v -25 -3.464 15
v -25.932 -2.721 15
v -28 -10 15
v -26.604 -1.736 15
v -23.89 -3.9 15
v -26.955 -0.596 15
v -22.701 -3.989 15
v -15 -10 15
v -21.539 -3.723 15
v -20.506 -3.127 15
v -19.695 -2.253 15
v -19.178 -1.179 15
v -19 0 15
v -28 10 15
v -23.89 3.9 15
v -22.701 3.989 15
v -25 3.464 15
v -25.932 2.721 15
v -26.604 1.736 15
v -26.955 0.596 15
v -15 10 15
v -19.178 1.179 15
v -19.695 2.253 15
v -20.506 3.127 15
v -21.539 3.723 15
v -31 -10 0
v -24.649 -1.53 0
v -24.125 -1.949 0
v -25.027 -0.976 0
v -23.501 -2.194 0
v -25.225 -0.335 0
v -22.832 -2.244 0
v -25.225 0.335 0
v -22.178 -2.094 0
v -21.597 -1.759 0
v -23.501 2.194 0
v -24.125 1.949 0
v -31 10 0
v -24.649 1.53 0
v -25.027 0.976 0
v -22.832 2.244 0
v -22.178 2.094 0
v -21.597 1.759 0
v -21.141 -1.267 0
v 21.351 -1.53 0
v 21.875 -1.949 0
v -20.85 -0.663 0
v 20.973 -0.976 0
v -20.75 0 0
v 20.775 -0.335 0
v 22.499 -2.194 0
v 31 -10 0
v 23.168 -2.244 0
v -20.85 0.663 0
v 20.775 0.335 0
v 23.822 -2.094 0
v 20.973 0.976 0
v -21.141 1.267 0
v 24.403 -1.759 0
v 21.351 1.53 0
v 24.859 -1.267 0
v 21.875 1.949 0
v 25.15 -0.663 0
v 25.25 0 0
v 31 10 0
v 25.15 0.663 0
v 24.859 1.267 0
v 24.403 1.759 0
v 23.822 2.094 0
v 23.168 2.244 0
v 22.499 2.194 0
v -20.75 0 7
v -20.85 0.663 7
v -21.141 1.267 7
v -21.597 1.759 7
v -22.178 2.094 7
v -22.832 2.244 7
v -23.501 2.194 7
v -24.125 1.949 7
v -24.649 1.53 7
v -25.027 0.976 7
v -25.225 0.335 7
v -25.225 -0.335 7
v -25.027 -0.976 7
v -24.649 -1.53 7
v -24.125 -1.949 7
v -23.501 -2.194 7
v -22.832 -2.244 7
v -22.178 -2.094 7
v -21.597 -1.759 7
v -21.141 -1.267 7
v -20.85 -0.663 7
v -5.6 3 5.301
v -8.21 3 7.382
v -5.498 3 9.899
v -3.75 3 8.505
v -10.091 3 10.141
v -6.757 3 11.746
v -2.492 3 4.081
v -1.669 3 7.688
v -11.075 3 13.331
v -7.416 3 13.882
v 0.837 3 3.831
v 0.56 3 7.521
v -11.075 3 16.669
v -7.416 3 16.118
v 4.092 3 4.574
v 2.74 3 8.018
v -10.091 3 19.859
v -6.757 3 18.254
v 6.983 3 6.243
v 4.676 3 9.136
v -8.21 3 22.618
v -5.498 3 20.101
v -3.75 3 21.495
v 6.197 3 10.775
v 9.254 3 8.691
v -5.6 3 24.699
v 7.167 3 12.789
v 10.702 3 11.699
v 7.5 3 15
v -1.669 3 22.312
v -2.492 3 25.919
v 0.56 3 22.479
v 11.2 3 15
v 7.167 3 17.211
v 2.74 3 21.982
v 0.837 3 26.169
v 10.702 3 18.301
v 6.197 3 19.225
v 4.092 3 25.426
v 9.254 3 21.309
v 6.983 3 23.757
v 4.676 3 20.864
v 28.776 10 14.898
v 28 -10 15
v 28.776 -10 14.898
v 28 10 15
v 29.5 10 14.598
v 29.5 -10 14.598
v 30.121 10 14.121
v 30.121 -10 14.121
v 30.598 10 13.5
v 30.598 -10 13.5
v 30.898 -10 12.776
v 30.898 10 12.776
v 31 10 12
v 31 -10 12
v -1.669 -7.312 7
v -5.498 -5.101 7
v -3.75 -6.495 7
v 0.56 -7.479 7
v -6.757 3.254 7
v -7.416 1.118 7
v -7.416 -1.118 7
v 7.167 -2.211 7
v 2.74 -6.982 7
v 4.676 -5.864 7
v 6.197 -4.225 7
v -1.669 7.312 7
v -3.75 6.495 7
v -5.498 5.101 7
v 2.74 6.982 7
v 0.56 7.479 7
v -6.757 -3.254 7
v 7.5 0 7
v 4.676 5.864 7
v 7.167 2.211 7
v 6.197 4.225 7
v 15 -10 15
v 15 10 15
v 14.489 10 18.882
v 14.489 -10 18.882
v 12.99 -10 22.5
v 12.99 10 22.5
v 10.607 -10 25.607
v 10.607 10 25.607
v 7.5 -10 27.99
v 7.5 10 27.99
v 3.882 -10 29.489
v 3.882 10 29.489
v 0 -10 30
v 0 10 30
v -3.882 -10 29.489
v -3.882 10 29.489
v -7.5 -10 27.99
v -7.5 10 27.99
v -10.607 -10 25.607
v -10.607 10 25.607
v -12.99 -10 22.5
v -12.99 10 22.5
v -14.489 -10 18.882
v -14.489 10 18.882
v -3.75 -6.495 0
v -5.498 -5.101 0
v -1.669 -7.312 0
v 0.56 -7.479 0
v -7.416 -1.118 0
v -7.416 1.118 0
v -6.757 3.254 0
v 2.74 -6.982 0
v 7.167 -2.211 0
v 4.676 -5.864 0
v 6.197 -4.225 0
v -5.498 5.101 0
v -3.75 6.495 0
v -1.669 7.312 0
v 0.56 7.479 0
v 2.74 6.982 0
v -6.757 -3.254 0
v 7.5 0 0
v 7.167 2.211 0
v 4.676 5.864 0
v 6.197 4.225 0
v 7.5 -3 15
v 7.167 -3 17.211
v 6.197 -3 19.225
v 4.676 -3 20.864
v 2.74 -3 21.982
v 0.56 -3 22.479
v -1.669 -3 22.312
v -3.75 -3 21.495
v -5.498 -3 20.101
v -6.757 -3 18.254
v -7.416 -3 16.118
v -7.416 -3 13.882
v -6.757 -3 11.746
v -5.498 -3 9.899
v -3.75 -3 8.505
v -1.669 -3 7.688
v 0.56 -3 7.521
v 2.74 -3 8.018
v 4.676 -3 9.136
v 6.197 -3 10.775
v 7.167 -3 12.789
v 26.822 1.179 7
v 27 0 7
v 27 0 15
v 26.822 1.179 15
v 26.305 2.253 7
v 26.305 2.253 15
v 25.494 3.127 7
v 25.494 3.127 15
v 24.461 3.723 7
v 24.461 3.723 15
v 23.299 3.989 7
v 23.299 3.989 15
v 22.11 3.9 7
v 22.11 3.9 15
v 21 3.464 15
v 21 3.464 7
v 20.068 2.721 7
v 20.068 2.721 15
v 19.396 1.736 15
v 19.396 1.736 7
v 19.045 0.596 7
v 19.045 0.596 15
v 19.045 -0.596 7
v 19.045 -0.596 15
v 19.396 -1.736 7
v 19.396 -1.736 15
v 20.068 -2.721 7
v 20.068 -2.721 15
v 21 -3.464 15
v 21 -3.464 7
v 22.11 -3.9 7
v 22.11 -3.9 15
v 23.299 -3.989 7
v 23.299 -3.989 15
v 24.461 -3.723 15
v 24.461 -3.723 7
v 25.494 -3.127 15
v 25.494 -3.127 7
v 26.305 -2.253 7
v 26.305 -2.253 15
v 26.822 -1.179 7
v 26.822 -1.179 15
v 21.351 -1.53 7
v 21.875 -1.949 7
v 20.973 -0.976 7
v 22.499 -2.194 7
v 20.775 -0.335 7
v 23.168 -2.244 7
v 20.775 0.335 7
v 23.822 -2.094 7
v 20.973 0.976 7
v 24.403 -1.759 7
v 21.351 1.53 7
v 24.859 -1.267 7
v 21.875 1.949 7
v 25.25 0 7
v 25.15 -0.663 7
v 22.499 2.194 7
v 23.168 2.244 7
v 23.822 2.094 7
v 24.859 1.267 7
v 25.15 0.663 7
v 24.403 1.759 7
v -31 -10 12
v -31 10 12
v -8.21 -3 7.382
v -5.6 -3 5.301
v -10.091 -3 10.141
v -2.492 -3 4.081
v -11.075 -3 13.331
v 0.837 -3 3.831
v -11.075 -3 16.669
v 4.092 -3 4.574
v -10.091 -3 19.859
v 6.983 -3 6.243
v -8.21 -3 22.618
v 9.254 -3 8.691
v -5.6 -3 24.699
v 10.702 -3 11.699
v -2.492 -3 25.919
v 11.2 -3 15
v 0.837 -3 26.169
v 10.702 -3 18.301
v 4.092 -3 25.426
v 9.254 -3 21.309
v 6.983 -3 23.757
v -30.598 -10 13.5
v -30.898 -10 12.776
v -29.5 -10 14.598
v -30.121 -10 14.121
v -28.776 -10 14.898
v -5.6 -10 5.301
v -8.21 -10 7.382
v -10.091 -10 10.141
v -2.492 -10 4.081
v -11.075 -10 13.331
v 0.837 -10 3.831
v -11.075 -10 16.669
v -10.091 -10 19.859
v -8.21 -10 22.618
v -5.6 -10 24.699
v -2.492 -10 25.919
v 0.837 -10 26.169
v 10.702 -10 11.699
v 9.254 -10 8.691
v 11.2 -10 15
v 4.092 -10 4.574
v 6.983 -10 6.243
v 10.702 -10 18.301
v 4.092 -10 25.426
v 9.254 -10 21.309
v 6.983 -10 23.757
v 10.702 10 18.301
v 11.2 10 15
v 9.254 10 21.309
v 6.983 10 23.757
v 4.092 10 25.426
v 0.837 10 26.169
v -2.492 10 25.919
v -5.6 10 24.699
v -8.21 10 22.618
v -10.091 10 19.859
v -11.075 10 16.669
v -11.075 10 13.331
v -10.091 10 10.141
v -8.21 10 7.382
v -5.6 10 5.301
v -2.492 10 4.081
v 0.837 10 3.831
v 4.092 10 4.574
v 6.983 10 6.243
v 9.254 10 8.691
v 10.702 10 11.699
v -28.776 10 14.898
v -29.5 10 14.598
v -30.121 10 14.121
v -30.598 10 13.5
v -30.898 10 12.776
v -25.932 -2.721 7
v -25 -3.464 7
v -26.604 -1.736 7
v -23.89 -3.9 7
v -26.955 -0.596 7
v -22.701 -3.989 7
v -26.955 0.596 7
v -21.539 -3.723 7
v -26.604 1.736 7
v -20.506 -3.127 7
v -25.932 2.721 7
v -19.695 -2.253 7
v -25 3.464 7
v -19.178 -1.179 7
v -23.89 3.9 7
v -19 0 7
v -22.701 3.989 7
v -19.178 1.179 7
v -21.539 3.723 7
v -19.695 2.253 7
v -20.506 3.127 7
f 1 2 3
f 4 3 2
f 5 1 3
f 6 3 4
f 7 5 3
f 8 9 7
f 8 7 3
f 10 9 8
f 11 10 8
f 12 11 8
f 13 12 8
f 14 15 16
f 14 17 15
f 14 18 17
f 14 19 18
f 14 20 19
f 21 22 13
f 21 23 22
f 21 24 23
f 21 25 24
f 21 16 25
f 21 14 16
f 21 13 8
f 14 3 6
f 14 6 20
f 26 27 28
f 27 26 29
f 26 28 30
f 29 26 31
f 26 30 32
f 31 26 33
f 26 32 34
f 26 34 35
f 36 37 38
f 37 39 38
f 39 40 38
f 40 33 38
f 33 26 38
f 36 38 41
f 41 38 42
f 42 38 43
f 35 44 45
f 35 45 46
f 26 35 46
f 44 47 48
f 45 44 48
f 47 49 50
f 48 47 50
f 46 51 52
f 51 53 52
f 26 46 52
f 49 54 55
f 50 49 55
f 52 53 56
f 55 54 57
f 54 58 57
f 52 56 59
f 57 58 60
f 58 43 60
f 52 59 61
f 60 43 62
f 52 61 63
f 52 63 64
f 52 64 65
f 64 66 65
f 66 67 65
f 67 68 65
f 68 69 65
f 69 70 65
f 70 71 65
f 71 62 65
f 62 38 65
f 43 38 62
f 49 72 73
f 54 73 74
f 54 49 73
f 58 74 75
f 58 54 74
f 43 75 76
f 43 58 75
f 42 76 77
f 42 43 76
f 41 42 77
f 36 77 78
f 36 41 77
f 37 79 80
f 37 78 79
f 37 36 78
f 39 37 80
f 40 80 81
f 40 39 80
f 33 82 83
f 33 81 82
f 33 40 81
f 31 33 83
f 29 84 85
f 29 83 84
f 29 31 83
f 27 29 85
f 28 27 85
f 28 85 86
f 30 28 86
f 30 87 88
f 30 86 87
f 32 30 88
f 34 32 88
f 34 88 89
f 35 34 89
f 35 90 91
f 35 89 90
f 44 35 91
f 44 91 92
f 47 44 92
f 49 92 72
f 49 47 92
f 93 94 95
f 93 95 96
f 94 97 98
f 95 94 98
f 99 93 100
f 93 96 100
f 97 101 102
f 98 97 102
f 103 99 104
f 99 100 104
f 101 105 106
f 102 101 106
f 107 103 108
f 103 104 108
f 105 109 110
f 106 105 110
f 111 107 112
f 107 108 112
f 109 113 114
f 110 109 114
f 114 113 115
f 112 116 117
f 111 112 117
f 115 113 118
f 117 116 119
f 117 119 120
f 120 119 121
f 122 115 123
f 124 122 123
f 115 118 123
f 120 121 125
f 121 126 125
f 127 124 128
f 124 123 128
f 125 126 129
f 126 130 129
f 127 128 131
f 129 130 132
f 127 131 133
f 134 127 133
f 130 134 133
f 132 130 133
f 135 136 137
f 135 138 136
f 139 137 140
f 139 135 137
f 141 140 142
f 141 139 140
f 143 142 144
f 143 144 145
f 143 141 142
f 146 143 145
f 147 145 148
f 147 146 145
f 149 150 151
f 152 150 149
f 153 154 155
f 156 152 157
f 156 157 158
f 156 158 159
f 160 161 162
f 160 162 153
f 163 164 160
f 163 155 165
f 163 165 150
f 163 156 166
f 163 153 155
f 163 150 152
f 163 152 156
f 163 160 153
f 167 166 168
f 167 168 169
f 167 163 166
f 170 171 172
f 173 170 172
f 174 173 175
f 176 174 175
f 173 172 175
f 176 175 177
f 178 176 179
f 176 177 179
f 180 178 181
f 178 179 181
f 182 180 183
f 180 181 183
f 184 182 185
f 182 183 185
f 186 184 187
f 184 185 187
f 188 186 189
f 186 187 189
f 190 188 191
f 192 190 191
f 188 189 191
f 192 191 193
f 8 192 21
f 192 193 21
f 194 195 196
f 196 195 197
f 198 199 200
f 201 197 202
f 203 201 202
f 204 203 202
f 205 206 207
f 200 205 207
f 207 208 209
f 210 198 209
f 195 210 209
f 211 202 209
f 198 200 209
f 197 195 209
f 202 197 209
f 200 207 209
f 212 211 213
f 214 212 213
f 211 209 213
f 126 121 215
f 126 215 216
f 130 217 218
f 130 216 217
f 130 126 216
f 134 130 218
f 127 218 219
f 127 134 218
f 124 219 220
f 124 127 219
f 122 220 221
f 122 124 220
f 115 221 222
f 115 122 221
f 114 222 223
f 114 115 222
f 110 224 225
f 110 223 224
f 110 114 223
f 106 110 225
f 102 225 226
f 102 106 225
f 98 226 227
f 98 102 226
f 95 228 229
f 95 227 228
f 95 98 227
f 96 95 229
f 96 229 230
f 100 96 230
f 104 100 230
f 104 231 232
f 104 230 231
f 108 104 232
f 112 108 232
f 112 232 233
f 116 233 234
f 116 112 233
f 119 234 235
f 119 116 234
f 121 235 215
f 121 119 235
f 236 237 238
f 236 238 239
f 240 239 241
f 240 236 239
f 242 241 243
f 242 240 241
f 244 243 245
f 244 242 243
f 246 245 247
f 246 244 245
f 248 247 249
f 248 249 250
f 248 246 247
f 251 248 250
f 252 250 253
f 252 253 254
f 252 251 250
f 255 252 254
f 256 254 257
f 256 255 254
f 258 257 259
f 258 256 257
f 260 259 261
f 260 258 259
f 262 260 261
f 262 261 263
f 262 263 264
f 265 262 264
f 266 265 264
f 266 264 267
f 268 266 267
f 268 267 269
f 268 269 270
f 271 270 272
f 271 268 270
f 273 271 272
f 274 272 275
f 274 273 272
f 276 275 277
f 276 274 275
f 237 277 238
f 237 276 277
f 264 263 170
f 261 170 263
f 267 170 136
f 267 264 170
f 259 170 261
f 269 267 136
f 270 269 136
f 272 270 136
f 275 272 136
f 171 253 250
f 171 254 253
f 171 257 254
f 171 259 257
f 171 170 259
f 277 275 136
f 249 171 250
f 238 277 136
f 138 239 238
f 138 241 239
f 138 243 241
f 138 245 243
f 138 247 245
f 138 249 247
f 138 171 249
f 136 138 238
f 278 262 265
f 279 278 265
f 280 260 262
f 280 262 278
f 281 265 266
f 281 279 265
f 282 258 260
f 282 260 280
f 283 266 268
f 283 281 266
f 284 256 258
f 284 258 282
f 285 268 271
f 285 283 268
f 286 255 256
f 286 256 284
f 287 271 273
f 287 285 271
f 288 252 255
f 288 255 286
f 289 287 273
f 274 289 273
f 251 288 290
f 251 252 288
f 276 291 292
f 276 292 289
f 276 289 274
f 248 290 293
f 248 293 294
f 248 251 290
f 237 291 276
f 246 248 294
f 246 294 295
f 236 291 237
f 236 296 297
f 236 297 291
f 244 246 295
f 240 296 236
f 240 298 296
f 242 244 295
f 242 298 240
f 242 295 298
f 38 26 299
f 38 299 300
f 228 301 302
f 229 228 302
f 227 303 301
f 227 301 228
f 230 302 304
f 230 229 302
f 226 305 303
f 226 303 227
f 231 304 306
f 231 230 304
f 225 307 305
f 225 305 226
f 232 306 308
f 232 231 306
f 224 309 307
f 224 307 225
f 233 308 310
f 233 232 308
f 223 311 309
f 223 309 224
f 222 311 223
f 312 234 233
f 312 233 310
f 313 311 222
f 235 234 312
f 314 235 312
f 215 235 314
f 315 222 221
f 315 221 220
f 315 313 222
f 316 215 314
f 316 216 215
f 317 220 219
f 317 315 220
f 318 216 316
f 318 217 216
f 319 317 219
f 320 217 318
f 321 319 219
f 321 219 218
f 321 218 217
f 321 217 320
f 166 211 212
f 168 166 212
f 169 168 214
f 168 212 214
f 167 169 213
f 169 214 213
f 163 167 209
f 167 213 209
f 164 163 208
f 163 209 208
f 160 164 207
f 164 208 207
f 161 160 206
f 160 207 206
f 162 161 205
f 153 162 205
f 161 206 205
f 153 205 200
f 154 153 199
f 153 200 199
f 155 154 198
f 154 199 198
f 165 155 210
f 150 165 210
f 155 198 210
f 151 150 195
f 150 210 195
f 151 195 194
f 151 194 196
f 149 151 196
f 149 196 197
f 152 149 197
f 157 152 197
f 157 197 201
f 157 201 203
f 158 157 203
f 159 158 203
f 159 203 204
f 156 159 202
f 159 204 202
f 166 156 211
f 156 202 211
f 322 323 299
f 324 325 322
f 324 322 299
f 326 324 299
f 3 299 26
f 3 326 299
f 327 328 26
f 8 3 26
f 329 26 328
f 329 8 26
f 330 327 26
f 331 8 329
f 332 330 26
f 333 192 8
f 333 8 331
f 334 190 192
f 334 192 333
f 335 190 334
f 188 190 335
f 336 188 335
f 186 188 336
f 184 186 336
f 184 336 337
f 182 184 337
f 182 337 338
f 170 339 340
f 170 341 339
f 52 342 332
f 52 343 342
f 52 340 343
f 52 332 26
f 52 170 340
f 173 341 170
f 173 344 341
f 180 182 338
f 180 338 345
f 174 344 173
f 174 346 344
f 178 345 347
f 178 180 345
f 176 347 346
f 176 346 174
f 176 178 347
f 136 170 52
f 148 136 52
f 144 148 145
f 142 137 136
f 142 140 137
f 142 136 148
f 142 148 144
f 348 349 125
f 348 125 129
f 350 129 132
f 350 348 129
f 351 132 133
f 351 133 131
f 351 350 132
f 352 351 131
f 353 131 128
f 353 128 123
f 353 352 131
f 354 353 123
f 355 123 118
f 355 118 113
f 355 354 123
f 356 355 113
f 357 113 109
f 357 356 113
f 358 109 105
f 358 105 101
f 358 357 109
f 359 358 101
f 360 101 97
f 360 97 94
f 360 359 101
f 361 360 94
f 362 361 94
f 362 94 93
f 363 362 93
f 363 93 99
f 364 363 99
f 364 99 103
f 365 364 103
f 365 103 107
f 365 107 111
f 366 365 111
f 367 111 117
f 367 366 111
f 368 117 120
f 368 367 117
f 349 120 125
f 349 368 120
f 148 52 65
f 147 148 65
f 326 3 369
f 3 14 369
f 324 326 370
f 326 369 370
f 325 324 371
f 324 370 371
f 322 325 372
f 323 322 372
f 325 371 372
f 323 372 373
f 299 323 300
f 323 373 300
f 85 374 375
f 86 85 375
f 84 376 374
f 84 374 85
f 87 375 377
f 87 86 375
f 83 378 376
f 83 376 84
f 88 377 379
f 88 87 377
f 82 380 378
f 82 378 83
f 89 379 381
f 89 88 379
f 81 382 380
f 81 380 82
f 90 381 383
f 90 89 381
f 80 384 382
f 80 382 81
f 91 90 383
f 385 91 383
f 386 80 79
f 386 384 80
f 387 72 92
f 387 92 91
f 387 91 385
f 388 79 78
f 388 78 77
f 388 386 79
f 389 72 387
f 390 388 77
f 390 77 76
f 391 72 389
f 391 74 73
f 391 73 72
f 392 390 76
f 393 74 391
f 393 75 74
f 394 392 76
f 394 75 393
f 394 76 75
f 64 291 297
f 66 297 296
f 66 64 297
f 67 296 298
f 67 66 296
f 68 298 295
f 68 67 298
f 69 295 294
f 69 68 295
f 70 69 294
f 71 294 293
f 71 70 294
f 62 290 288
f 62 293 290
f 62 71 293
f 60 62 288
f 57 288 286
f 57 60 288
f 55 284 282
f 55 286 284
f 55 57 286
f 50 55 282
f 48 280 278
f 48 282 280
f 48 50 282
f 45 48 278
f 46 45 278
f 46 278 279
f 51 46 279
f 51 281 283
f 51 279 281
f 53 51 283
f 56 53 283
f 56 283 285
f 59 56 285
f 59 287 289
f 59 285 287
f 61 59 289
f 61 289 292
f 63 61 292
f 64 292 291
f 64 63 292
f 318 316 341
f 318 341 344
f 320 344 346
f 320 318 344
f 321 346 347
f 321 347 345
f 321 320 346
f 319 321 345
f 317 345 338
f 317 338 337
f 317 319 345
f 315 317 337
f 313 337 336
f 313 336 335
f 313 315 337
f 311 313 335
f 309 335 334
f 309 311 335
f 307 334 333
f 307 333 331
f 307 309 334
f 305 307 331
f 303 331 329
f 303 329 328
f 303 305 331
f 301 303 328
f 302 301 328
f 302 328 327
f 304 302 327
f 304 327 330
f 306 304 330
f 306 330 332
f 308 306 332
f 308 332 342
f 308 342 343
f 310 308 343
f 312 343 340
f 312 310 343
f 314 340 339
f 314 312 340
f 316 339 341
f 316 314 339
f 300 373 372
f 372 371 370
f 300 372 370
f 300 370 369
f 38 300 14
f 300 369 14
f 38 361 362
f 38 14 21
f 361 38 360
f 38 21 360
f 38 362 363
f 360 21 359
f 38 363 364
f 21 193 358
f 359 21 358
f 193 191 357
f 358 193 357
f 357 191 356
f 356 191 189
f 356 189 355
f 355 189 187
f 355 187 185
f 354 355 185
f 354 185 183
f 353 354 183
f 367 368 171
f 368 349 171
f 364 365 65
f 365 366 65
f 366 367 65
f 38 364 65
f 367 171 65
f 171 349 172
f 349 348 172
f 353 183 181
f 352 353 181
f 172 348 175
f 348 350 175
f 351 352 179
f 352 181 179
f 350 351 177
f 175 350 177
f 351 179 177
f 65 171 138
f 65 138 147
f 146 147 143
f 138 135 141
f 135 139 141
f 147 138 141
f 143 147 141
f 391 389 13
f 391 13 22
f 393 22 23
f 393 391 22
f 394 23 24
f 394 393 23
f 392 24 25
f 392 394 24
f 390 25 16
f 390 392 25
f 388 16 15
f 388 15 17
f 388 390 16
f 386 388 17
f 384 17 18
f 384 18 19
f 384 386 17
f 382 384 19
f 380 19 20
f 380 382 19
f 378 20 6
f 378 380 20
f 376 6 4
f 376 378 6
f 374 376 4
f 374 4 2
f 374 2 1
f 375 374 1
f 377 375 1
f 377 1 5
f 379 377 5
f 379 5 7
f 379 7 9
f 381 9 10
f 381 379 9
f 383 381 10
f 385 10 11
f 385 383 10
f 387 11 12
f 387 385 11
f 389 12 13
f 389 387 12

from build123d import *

# Parameters (mm, degrees)
CYLINDER001_R     = 7.5
CYLINDER001_DEPTH = 7
CYLINDER008_R     = 4
CYLINDER008_DEPTH = 8
CYLINDER007_R     = 2.25
CYLINDER007_DEPTH = 15
CYLINDER_R        = 11.2
CYLINDER_DEPTH    = 7
CYLINDER002_R     = 11.2
CYLINDER002_DEPTH = 7
CYLINDER004_R     = 7.5
CYLINDER004_DEPTH = 20
CYLINDER006_R     = 4
CYLINDER006_DEPTH = 8
CYLINDER005_R     = 2.25
CYLINDER005_DEPTH = 15
CYLINDER003_R     = 15
CYLINDER003_DEPTH = 20
BOX001_W          = 62
BOX001_H          = 20
BOX001_DEPTH      = 15
FILLET_R          = 3


with BuildPart() as cylinder001:
    # Cylinder001 → Cylinder001 (new body)
    with BuildSketch(Plane.XY):
        Circle(CYLINDER001_R)
    extrude(amount=CYLINDER001_DEPTH)


with BuildPart() as cylinder008:
    # Cylinder008 → Cylinder008 (new body)
    with BuildSketch(Plane.XY.offset(7)):
        Circle(CYLINDER008_R)
    extrude(amount=CYLINDER008_DEPTH)


with BuildPart() as fusion002:
    # Cylinder007 → Cylinder007 (new body)
    with BuildSketch(Plane.XY):
        Circle(CYLINDER007_R)
    extrude(amount=CYLINDER007_DEPTH)

    # Fusion002: union Cylinder008
    add(cylinder008.part)


with BuildPart() as fusion002_1:
    # Fusion002 placement: moved
    add(fusion002.part.moved(Location((-23, 0, 0))))


with BuildPart() as cylinder:
    # Cylinder → Cylinder (new body)
    with BuildSketch(Plane(origin=(0, -3, 15), x_dir=(1, 0, 0), z_dir=(0, -1, 0))):
        Circle(CYLINDER_R)
    extrude(amount=CYLINDER_DEPTH)


with BuildPart() as cylinder002:
    # Cylinder002 → Cylinder002 (new body)
    with BuildSketch(Plane(origin=(0, 10, 15), x_dir=(1, 0, 0), z_dir=(0, -1, 0))):
        Circle(CYLINDER002_R)
    extrude(amount=CYLINDER002_DEPTH)


with BuildPart() as fusion:
    # Cylinder004 → Cylinder004 (new body)
    with BuildSketch(Plane(origin=(0, 10, 15), x_dir=(1, 0, 0), z_dir=(0, -1, 0))):
        Circle(CYLINDER004_R)
    extrude(amount=CYLINDER004_DEPTH)

    # Fusion: union Cylinder, Cylinder002
    add(cylinder.part)
    add(cylinder002.part)


with BuildPart() as cylinder006:
    # Cylinder006 → Cylinder006 (new body)
    with BuildSketch(Plane.XY.offset(7)):
        Circle(CYLINDER006_R)
    extrude(amount=CYLINDER006_DEPTH)


with BuildPart() as fusion003:
    # Cylinder005 → Cylinder005 (new body)
    with BuildSketch(Plane.XY):
        Circle(CYLINDER005_R)
    extrude(amount=CYLINDER005_DEPTH)

    # Fusion001: union Cylinder006
    add(cylinder006.part)


with BuildPart() as fusion003_1:
    # Fusion001 placement: moved
    add(fusion003.part.moved(Location((23, 0, 0))))

    # Fusion003: union Fusion002, Fusion
    add(fusion002_1.part)
    add(fusion.part)


with BuildPart() as cylinder003:
    # Cylinder003 → Cylinder003 (new body)
    with BuildSketch(Plane(origin=(0, 10, 15), x_dir=(1, 0, 0), z_dir=(0, -1, 0))):
        Circle(CYLINDER003_R)
    extrude(amount=CYLINDER003_DEPTH)


with BuildPart() as fillet_body:
    # Box001 → Box001 (new body)
    with BuildSketch(Plane(origin=(-31, -10, 0), x_dir=(1, 0, 0), z_dir=(0, 0, 1))):
        with Locations((31, 10)):
            Rectangle(BOX001_W, BOX001_H)
    extrude(amount=BOX001_DEPTH)

    # Fusion004: union Cylinder003
    add(cylinder003.part)

    # Cut: cut Fusion003
    add(fusion003_1.part, mode=Mode.SUBTRACT)

    # Fillet
    fillet_edges = [fillet_body.edges().sort_by_distance(p)[0] for p in [
        (-31, 0, 15),
        (31, 0, 15),
    ]]
    fillet(fillet_edges, radius=FILLET_R)


solid = Compound([cylinder001.part, fillet_body.part])
